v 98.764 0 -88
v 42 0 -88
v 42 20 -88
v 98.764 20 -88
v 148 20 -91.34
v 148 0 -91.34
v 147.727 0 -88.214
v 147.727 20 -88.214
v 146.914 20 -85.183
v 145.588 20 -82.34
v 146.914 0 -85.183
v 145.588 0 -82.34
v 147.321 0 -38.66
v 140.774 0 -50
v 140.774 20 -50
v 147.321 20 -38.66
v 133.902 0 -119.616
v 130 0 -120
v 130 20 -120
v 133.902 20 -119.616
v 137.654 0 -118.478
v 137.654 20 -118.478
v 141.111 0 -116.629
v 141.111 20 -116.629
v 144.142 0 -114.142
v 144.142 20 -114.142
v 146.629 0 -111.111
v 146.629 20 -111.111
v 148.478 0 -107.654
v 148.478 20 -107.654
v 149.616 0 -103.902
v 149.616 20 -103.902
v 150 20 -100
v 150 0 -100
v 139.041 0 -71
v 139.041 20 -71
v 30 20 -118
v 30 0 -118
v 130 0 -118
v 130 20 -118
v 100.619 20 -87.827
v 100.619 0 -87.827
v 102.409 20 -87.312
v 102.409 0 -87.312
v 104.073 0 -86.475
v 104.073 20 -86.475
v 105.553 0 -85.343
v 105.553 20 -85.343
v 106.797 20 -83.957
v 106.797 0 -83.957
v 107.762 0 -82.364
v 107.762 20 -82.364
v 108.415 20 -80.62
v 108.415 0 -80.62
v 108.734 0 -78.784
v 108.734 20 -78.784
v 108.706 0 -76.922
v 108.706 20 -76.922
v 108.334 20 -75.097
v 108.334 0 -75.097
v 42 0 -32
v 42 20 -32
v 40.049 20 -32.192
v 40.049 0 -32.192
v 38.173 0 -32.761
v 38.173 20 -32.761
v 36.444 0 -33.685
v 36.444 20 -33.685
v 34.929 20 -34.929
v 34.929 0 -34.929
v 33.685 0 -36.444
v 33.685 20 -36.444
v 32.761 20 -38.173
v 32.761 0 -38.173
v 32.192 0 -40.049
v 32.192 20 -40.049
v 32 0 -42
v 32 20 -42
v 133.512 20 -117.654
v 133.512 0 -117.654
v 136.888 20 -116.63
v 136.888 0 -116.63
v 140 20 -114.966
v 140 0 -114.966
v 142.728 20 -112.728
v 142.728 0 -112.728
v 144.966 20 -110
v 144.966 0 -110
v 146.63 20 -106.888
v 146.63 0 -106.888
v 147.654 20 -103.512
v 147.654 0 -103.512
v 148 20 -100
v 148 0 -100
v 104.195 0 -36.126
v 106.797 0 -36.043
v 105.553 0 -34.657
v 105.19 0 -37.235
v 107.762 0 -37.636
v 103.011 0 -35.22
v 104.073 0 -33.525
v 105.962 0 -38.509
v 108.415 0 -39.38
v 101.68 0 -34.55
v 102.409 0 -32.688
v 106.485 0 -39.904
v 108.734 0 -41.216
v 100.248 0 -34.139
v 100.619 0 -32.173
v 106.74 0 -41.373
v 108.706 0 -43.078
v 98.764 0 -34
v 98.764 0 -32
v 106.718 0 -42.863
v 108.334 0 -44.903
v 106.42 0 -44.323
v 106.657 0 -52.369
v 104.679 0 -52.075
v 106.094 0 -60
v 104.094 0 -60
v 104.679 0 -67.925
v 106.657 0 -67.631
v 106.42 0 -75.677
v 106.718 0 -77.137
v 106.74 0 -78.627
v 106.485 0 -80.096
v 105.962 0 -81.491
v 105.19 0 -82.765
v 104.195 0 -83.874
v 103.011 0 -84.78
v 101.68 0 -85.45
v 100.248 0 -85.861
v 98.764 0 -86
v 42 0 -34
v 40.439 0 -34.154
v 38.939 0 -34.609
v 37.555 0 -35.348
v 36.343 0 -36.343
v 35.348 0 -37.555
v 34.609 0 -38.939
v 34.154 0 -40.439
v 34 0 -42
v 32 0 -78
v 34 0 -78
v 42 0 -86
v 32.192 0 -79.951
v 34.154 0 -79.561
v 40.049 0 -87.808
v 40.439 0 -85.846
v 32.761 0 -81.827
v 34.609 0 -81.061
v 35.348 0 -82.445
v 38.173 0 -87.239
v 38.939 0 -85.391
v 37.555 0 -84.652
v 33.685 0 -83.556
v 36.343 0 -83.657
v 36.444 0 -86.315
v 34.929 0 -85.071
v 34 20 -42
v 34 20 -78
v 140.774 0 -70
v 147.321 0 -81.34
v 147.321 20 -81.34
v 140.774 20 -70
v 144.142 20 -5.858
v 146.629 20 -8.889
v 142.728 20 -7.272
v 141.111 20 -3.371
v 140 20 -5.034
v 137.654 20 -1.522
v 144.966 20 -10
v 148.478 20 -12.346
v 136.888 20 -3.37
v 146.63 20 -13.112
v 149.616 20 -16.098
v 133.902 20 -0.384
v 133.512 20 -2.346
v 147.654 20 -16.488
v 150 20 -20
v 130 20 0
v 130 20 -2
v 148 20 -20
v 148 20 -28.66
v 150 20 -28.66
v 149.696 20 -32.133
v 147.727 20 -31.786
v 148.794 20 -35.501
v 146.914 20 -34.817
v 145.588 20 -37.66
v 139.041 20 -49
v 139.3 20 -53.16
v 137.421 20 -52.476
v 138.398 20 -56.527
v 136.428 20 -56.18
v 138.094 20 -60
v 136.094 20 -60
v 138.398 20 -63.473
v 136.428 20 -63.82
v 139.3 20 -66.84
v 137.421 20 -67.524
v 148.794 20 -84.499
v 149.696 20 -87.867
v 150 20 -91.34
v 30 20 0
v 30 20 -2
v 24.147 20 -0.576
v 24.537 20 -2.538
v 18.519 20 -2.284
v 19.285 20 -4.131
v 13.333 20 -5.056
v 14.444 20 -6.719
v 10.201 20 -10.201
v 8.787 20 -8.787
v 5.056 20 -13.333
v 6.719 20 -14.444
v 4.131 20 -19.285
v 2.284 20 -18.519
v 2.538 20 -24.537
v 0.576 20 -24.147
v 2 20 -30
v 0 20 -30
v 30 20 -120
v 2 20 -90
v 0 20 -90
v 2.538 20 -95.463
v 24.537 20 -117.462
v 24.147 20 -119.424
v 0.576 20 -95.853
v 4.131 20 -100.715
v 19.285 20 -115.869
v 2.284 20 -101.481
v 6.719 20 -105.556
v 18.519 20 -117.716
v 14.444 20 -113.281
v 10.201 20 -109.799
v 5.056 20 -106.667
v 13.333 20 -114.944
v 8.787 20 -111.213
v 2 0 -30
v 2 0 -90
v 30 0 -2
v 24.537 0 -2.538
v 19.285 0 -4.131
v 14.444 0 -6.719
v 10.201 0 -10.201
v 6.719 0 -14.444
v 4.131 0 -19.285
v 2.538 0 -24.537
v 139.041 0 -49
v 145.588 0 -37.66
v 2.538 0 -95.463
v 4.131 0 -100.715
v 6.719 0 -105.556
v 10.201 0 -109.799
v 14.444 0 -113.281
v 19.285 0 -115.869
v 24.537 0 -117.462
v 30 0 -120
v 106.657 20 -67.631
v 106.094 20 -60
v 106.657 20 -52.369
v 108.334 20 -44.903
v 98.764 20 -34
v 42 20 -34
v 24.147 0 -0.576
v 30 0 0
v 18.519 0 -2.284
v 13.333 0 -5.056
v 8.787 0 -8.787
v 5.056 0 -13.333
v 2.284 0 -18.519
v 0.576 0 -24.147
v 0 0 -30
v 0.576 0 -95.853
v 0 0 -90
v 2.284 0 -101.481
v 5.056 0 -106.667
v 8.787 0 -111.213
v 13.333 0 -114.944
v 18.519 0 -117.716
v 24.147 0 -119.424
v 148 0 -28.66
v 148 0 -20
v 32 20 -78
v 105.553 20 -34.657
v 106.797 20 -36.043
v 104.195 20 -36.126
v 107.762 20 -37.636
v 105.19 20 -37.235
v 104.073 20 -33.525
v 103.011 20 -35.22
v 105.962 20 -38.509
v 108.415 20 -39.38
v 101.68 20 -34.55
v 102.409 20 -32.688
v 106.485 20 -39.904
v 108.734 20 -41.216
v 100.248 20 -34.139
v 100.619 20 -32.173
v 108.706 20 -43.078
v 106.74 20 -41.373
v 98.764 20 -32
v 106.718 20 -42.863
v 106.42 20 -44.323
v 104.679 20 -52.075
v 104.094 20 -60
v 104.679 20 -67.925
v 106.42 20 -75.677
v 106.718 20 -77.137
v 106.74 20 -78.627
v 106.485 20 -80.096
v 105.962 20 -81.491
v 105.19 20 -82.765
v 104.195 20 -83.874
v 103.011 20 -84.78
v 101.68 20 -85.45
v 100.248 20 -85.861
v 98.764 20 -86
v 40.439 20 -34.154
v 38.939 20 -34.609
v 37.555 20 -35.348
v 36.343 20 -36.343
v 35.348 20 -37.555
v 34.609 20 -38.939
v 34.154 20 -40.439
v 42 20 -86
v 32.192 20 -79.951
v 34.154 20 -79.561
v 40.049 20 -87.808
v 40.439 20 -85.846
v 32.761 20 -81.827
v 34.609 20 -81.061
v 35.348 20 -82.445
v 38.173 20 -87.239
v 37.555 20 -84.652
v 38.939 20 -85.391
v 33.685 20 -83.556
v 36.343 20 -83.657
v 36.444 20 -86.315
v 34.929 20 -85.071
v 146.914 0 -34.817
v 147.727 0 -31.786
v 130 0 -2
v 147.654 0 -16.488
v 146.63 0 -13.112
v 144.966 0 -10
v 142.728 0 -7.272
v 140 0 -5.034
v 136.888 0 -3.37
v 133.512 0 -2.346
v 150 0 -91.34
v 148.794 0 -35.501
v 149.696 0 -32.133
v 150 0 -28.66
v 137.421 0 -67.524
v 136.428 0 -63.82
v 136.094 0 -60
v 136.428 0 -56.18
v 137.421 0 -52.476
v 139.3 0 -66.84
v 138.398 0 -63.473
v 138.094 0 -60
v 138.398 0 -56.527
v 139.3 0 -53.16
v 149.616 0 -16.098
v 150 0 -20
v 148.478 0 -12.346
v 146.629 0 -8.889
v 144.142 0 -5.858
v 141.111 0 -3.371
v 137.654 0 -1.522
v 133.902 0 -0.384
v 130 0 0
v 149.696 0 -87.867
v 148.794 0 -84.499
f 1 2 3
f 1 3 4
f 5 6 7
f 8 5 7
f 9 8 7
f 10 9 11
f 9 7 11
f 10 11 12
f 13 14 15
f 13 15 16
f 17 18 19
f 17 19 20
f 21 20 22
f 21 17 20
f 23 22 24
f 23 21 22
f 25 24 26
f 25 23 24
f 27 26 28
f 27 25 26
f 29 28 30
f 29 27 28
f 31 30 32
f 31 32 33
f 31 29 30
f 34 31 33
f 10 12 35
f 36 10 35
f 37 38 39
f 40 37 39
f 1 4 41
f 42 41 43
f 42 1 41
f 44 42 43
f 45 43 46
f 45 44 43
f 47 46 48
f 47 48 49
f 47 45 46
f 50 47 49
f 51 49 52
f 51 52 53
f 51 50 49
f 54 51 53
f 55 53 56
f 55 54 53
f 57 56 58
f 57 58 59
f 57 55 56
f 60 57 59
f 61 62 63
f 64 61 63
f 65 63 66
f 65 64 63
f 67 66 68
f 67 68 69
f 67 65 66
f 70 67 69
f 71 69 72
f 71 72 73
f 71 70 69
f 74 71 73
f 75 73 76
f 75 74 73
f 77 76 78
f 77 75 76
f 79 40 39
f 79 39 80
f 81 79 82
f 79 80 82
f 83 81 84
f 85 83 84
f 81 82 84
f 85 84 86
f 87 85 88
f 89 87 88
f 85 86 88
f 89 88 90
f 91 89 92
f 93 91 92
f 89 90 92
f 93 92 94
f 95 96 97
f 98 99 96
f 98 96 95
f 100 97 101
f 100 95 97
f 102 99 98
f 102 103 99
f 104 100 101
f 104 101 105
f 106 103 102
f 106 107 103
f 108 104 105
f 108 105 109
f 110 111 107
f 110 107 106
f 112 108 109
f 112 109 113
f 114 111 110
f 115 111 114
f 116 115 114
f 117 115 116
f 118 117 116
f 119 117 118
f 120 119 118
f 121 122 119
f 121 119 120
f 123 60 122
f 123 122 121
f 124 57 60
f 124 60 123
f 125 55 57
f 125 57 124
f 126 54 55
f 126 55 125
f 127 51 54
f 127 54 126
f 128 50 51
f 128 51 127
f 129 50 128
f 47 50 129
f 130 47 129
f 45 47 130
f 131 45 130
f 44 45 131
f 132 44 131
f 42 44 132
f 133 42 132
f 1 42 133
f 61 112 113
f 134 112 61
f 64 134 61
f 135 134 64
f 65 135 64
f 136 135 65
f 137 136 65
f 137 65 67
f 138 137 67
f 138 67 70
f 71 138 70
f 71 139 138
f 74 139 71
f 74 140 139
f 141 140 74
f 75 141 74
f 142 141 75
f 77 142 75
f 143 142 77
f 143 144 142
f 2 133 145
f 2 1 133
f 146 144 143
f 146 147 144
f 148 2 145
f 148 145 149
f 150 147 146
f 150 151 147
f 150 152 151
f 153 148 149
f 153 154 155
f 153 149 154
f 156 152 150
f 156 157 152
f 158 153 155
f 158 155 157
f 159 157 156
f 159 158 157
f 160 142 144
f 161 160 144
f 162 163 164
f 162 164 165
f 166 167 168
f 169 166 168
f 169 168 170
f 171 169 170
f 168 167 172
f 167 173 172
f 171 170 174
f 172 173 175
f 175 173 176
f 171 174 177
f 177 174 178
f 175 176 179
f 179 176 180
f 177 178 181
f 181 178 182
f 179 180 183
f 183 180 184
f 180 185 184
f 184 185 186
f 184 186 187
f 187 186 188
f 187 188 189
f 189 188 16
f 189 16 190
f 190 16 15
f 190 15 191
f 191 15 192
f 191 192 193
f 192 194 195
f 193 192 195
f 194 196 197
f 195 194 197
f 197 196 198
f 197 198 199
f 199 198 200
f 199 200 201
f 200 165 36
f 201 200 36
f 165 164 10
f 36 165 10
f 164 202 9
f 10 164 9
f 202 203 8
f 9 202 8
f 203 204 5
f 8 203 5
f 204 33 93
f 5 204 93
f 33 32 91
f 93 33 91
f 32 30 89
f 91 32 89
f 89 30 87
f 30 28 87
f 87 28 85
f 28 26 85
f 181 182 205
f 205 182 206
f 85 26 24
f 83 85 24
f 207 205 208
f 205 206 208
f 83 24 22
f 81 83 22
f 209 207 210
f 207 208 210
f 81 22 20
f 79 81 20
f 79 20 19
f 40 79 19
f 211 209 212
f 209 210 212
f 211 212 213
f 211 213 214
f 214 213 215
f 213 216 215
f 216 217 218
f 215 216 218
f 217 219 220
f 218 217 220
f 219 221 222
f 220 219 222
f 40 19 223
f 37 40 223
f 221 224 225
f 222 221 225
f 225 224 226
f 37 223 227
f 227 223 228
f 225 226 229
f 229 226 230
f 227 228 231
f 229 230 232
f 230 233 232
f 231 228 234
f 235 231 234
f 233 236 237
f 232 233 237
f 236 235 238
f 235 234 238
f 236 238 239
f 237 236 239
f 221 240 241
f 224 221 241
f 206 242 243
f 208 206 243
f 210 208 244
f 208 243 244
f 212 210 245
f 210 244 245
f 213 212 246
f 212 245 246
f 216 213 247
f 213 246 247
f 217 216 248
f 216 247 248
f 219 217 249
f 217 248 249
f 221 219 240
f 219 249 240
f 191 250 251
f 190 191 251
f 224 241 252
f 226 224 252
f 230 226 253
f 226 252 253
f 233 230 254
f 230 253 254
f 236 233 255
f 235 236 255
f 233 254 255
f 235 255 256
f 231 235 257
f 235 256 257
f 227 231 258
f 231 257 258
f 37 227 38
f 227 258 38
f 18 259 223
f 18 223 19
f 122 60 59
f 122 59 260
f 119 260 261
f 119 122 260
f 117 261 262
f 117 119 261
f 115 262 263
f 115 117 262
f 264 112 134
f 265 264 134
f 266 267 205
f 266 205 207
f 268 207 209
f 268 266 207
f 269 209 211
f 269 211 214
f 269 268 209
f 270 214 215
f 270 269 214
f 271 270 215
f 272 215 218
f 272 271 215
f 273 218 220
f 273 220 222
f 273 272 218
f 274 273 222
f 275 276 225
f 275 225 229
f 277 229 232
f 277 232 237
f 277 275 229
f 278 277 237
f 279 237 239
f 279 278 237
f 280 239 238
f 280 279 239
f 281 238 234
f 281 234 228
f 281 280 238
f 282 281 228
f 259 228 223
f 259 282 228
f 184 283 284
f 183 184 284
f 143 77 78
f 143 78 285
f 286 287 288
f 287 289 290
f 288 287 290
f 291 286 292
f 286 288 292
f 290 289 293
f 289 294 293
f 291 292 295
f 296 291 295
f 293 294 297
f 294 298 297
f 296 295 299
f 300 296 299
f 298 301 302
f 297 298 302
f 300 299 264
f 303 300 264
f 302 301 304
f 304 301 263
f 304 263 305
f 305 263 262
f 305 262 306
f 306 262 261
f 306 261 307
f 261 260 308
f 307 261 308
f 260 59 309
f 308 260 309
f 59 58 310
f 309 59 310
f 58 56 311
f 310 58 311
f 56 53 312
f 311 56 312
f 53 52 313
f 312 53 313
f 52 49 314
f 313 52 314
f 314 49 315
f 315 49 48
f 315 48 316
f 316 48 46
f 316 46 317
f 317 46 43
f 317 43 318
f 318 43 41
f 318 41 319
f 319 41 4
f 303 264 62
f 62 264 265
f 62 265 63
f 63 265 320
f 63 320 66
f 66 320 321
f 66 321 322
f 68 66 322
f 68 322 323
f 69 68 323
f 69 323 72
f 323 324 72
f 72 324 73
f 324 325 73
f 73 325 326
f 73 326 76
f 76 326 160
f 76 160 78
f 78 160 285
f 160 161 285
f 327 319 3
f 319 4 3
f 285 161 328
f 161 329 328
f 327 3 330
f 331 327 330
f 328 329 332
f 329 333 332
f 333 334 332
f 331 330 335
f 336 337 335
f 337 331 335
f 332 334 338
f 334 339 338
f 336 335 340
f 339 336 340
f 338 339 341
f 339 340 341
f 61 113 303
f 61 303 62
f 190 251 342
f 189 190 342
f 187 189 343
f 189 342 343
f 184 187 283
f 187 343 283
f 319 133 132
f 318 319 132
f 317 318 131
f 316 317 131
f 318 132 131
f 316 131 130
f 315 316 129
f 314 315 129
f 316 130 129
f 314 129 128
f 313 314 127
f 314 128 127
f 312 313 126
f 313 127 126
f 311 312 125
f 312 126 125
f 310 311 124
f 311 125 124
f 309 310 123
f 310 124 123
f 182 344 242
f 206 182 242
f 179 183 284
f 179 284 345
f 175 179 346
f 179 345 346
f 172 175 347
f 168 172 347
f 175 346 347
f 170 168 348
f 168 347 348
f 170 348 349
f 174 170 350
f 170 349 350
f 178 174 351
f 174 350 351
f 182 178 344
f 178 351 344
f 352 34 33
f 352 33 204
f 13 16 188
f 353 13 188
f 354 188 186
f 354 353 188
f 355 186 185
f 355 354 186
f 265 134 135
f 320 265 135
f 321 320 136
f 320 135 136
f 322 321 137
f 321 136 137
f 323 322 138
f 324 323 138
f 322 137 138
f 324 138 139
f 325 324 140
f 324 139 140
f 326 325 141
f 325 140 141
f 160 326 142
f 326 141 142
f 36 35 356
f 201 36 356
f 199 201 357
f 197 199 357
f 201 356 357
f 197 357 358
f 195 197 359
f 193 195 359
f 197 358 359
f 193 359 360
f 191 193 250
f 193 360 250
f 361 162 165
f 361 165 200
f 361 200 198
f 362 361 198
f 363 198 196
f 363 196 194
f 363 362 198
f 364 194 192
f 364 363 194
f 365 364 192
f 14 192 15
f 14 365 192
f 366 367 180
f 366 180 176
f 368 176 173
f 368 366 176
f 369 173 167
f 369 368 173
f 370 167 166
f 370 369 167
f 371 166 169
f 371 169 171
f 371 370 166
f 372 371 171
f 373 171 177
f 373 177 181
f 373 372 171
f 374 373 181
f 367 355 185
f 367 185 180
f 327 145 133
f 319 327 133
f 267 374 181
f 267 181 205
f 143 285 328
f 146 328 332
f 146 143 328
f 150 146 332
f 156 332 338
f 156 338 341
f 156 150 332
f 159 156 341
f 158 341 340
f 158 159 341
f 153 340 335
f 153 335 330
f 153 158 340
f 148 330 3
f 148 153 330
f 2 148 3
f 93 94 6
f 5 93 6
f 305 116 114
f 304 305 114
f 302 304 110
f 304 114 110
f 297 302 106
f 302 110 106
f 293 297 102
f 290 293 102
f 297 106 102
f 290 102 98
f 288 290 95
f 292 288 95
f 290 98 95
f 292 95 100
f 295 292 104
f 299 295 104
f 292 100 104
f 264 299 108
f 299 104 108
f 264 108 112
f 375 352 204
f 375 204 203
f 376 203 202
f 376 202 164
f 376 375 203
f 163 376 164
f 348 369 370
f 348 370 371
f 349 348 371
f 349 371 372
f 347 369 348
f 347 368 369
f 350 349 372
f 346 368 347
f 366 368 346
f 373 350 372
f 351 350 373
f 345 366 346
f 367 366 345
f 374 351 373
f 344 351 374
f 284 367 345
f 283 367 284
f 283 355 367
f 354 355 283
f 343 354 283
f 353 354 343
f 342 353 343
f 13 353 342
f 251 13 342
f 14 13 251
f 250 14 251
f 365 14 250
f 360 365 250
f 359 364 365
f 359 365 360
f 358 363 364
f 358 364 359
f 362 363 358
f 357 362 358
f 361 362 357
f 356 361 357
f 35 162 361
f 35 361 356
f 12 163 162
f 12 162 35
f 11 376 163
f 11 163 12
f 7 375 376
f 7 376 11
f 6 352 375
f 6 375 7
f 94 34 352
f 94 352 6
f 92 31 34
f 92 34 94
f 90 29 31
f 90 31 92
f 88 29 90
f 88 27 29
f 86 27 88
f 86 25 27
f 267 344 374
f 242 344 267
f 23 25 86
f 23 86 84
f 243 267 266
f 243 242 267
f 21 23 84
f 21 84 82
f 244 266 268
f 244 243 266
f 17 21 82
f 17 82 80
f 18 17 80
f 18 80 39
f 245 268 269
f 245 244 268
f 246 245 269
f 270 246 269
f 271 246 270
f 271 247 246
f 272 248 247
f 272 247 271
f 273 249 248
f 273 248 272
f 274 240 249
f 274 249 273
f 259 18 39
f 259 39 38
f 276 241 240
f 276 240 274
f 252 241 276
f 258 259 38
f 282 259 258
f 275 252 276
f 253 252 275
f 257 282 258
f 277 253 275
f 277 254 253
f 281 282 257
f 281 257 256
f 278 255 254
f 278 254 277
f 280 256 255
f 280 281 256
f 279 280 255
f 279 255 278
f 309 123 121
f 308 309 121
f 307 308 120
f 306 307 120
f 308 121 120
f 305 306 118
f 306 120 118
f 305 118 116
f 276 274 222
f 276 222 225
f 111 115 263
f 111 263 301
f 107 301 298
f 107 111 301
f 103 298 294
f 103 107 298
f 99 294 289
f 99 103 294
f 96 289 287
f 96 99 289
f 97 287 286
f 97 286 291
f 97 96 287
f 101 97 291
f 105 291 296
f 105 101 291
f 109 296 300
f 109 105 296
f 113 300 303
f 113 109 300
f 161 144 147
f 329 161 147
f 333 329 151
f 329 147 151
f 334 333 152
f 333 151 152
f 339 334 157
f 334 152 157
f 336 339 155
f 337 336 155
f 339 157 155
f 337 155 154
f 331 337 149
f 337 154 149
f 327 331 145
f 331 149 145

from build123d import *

# Parameters (mm, degrees)
EXTRUDE_2_DEPTH   = 20
EXTRUDE_2_2_DEPTH = 20


with BuildPart() as part:
    # 草图2 → 凸台-拉伸2 (new body)
    with BuildSketch(Plane(origin=(0, 0, 0), x_dir=(1, 0, 0), z_dir=(0, 1, 0))):
        with BuildLine():
            ThreePointArc((30, 0), (8.786796564, 8.786796564), (0, 30))
            Line((0, 30), (0, 90))
            ThreePointArc((0, 90), (8.786796564, 111.213203436), (30, 120))
            Line((30, 120), (130, 120))
            ThreePointArc((130, 120), (144.142135624, 114.142135624), (150, 100))
            Line((150, 100), (150, 91.339745962))
            ThreePointArc((150, 91.339745962), (149.318516526, 86.16336506), (147.320508076, 81.339745962))
            Line((147.320508076, 81.339745962), (140.773502692, 70))
            ThreePointArc((140.773502692, 70), (138.094010768, 60), (140.773502692, 50))
            Line((140.773502692, 50), (147.320508076, 38.660254038))
            ThreePointArc((147.320508076, 38.660254038), (149.318516526, 33.83663494), (150, 28.660254038))
            Line((150, 28.660254038), (150, 20))
            ThreePointArc((150, 20), (144.142135624, 5.857864376), (130, 0))
            Line((130, 0), (30, 0))
        make_face()
        with BuildLine():
            Line((2, 30), (2, 90))
            ThreePointArc((2, 90), (10.201010127, 109.798989873), (30, 118))
            Line((30, 118), (130, 118))
            ThreePointArc((130, 118), (142.727922061, 112.727922061), (148, 100))
            Line((148, 100), (148, 91.339745962))
            ThreePointArc((148, 91.339745962), (147.386664873, 86.68100315), (145.588457268, 82.339745962))
            Line((145.588457268, 82.339745962), (139.041451884, 71))
            ThreePointArc((139.041451884, 71), (136.094010768, 60), (139.041451884, 49))
            Line((139.041451884, 49), (145.588457268, 37.660254038))
            ThreePointArc((145.588457268, 37.660254038), (147.386664873, 33.31899685), (148, 28.660254038))
            Line((148, 28.660254038), (148, 20))
            ThreePointArc((148, 20), (142.727922061, 7.272077939), (130, 2))
            Line((130, 2), (30, 2))
            ThreePointArc((30, 2), (10.201010127, 10.201010127), (2, 30))
        make_face(mode=Mode.SUBTRACT)
    extrude(amount=EXTRUDE_2_DEPTH)


with BuildPart() as body_2:
    # 草图2 → Extrude 2 2 (new body)
    with BuildSketch(Plane(origin=(0, 0, 0), x_dir=(1, 0, 0), z_dir=(0, 1, 0))):
        with BuildLine():
            ThreePointArc((32, 78), (34.928932188, 85.071067812), (42, 88))
            Line((42, 88), (98.764422871, 88))
            ThreePointArc((98.764422871, 88), (106.79661616, 83.956833972), (108.333711241, 75.096774194))
            ThreePointArc((108.333711241, 75.096774194), (106.094010768, 60), (108.333711241, 44.903225806))
            ThreePointArc((108.333711241, 44.903225806), (106.79661616, 36.043166028), (98.764422871, 32))
            Line((98.764422871, 32), (42, 32))
            ThreePointArc((42, 32), (34.928932188, 34.928932188), (32, 42))
            Line((32, 42), (32, 78))
        make_face()
        with BuildLine():
            Line((34, 42), (34, 78))
            ThreePointArc((34, 78), (36.343145751, 83.656854249), (42, 86))
            Line((42, 86), (98.764422871, 86))
            ThreePointArc((98.764422871, 86), (105.190177502, 82.765467177), (106.419853567, 75.677419355))
            ThreePointArc((106.419853567, 75.677419355), (104.094010768, 60), (106.419853567, 44.322580645))
            ThreePointArc((106.419853567, 44.322580645), (105.190177502, 37.234532823), (98.764422871, 34))
            Line((98.764422871, 34), (42, 34))
            ThreePointArc((42, 34), (36.343145751, 36.343145751), (34, 42))
        make_face(mode=Mode.SUBTRACT)
    extrude(amount=EXTRUDE_2_2_DEPTH)


solid = Compound([part.part, body_2.part])
